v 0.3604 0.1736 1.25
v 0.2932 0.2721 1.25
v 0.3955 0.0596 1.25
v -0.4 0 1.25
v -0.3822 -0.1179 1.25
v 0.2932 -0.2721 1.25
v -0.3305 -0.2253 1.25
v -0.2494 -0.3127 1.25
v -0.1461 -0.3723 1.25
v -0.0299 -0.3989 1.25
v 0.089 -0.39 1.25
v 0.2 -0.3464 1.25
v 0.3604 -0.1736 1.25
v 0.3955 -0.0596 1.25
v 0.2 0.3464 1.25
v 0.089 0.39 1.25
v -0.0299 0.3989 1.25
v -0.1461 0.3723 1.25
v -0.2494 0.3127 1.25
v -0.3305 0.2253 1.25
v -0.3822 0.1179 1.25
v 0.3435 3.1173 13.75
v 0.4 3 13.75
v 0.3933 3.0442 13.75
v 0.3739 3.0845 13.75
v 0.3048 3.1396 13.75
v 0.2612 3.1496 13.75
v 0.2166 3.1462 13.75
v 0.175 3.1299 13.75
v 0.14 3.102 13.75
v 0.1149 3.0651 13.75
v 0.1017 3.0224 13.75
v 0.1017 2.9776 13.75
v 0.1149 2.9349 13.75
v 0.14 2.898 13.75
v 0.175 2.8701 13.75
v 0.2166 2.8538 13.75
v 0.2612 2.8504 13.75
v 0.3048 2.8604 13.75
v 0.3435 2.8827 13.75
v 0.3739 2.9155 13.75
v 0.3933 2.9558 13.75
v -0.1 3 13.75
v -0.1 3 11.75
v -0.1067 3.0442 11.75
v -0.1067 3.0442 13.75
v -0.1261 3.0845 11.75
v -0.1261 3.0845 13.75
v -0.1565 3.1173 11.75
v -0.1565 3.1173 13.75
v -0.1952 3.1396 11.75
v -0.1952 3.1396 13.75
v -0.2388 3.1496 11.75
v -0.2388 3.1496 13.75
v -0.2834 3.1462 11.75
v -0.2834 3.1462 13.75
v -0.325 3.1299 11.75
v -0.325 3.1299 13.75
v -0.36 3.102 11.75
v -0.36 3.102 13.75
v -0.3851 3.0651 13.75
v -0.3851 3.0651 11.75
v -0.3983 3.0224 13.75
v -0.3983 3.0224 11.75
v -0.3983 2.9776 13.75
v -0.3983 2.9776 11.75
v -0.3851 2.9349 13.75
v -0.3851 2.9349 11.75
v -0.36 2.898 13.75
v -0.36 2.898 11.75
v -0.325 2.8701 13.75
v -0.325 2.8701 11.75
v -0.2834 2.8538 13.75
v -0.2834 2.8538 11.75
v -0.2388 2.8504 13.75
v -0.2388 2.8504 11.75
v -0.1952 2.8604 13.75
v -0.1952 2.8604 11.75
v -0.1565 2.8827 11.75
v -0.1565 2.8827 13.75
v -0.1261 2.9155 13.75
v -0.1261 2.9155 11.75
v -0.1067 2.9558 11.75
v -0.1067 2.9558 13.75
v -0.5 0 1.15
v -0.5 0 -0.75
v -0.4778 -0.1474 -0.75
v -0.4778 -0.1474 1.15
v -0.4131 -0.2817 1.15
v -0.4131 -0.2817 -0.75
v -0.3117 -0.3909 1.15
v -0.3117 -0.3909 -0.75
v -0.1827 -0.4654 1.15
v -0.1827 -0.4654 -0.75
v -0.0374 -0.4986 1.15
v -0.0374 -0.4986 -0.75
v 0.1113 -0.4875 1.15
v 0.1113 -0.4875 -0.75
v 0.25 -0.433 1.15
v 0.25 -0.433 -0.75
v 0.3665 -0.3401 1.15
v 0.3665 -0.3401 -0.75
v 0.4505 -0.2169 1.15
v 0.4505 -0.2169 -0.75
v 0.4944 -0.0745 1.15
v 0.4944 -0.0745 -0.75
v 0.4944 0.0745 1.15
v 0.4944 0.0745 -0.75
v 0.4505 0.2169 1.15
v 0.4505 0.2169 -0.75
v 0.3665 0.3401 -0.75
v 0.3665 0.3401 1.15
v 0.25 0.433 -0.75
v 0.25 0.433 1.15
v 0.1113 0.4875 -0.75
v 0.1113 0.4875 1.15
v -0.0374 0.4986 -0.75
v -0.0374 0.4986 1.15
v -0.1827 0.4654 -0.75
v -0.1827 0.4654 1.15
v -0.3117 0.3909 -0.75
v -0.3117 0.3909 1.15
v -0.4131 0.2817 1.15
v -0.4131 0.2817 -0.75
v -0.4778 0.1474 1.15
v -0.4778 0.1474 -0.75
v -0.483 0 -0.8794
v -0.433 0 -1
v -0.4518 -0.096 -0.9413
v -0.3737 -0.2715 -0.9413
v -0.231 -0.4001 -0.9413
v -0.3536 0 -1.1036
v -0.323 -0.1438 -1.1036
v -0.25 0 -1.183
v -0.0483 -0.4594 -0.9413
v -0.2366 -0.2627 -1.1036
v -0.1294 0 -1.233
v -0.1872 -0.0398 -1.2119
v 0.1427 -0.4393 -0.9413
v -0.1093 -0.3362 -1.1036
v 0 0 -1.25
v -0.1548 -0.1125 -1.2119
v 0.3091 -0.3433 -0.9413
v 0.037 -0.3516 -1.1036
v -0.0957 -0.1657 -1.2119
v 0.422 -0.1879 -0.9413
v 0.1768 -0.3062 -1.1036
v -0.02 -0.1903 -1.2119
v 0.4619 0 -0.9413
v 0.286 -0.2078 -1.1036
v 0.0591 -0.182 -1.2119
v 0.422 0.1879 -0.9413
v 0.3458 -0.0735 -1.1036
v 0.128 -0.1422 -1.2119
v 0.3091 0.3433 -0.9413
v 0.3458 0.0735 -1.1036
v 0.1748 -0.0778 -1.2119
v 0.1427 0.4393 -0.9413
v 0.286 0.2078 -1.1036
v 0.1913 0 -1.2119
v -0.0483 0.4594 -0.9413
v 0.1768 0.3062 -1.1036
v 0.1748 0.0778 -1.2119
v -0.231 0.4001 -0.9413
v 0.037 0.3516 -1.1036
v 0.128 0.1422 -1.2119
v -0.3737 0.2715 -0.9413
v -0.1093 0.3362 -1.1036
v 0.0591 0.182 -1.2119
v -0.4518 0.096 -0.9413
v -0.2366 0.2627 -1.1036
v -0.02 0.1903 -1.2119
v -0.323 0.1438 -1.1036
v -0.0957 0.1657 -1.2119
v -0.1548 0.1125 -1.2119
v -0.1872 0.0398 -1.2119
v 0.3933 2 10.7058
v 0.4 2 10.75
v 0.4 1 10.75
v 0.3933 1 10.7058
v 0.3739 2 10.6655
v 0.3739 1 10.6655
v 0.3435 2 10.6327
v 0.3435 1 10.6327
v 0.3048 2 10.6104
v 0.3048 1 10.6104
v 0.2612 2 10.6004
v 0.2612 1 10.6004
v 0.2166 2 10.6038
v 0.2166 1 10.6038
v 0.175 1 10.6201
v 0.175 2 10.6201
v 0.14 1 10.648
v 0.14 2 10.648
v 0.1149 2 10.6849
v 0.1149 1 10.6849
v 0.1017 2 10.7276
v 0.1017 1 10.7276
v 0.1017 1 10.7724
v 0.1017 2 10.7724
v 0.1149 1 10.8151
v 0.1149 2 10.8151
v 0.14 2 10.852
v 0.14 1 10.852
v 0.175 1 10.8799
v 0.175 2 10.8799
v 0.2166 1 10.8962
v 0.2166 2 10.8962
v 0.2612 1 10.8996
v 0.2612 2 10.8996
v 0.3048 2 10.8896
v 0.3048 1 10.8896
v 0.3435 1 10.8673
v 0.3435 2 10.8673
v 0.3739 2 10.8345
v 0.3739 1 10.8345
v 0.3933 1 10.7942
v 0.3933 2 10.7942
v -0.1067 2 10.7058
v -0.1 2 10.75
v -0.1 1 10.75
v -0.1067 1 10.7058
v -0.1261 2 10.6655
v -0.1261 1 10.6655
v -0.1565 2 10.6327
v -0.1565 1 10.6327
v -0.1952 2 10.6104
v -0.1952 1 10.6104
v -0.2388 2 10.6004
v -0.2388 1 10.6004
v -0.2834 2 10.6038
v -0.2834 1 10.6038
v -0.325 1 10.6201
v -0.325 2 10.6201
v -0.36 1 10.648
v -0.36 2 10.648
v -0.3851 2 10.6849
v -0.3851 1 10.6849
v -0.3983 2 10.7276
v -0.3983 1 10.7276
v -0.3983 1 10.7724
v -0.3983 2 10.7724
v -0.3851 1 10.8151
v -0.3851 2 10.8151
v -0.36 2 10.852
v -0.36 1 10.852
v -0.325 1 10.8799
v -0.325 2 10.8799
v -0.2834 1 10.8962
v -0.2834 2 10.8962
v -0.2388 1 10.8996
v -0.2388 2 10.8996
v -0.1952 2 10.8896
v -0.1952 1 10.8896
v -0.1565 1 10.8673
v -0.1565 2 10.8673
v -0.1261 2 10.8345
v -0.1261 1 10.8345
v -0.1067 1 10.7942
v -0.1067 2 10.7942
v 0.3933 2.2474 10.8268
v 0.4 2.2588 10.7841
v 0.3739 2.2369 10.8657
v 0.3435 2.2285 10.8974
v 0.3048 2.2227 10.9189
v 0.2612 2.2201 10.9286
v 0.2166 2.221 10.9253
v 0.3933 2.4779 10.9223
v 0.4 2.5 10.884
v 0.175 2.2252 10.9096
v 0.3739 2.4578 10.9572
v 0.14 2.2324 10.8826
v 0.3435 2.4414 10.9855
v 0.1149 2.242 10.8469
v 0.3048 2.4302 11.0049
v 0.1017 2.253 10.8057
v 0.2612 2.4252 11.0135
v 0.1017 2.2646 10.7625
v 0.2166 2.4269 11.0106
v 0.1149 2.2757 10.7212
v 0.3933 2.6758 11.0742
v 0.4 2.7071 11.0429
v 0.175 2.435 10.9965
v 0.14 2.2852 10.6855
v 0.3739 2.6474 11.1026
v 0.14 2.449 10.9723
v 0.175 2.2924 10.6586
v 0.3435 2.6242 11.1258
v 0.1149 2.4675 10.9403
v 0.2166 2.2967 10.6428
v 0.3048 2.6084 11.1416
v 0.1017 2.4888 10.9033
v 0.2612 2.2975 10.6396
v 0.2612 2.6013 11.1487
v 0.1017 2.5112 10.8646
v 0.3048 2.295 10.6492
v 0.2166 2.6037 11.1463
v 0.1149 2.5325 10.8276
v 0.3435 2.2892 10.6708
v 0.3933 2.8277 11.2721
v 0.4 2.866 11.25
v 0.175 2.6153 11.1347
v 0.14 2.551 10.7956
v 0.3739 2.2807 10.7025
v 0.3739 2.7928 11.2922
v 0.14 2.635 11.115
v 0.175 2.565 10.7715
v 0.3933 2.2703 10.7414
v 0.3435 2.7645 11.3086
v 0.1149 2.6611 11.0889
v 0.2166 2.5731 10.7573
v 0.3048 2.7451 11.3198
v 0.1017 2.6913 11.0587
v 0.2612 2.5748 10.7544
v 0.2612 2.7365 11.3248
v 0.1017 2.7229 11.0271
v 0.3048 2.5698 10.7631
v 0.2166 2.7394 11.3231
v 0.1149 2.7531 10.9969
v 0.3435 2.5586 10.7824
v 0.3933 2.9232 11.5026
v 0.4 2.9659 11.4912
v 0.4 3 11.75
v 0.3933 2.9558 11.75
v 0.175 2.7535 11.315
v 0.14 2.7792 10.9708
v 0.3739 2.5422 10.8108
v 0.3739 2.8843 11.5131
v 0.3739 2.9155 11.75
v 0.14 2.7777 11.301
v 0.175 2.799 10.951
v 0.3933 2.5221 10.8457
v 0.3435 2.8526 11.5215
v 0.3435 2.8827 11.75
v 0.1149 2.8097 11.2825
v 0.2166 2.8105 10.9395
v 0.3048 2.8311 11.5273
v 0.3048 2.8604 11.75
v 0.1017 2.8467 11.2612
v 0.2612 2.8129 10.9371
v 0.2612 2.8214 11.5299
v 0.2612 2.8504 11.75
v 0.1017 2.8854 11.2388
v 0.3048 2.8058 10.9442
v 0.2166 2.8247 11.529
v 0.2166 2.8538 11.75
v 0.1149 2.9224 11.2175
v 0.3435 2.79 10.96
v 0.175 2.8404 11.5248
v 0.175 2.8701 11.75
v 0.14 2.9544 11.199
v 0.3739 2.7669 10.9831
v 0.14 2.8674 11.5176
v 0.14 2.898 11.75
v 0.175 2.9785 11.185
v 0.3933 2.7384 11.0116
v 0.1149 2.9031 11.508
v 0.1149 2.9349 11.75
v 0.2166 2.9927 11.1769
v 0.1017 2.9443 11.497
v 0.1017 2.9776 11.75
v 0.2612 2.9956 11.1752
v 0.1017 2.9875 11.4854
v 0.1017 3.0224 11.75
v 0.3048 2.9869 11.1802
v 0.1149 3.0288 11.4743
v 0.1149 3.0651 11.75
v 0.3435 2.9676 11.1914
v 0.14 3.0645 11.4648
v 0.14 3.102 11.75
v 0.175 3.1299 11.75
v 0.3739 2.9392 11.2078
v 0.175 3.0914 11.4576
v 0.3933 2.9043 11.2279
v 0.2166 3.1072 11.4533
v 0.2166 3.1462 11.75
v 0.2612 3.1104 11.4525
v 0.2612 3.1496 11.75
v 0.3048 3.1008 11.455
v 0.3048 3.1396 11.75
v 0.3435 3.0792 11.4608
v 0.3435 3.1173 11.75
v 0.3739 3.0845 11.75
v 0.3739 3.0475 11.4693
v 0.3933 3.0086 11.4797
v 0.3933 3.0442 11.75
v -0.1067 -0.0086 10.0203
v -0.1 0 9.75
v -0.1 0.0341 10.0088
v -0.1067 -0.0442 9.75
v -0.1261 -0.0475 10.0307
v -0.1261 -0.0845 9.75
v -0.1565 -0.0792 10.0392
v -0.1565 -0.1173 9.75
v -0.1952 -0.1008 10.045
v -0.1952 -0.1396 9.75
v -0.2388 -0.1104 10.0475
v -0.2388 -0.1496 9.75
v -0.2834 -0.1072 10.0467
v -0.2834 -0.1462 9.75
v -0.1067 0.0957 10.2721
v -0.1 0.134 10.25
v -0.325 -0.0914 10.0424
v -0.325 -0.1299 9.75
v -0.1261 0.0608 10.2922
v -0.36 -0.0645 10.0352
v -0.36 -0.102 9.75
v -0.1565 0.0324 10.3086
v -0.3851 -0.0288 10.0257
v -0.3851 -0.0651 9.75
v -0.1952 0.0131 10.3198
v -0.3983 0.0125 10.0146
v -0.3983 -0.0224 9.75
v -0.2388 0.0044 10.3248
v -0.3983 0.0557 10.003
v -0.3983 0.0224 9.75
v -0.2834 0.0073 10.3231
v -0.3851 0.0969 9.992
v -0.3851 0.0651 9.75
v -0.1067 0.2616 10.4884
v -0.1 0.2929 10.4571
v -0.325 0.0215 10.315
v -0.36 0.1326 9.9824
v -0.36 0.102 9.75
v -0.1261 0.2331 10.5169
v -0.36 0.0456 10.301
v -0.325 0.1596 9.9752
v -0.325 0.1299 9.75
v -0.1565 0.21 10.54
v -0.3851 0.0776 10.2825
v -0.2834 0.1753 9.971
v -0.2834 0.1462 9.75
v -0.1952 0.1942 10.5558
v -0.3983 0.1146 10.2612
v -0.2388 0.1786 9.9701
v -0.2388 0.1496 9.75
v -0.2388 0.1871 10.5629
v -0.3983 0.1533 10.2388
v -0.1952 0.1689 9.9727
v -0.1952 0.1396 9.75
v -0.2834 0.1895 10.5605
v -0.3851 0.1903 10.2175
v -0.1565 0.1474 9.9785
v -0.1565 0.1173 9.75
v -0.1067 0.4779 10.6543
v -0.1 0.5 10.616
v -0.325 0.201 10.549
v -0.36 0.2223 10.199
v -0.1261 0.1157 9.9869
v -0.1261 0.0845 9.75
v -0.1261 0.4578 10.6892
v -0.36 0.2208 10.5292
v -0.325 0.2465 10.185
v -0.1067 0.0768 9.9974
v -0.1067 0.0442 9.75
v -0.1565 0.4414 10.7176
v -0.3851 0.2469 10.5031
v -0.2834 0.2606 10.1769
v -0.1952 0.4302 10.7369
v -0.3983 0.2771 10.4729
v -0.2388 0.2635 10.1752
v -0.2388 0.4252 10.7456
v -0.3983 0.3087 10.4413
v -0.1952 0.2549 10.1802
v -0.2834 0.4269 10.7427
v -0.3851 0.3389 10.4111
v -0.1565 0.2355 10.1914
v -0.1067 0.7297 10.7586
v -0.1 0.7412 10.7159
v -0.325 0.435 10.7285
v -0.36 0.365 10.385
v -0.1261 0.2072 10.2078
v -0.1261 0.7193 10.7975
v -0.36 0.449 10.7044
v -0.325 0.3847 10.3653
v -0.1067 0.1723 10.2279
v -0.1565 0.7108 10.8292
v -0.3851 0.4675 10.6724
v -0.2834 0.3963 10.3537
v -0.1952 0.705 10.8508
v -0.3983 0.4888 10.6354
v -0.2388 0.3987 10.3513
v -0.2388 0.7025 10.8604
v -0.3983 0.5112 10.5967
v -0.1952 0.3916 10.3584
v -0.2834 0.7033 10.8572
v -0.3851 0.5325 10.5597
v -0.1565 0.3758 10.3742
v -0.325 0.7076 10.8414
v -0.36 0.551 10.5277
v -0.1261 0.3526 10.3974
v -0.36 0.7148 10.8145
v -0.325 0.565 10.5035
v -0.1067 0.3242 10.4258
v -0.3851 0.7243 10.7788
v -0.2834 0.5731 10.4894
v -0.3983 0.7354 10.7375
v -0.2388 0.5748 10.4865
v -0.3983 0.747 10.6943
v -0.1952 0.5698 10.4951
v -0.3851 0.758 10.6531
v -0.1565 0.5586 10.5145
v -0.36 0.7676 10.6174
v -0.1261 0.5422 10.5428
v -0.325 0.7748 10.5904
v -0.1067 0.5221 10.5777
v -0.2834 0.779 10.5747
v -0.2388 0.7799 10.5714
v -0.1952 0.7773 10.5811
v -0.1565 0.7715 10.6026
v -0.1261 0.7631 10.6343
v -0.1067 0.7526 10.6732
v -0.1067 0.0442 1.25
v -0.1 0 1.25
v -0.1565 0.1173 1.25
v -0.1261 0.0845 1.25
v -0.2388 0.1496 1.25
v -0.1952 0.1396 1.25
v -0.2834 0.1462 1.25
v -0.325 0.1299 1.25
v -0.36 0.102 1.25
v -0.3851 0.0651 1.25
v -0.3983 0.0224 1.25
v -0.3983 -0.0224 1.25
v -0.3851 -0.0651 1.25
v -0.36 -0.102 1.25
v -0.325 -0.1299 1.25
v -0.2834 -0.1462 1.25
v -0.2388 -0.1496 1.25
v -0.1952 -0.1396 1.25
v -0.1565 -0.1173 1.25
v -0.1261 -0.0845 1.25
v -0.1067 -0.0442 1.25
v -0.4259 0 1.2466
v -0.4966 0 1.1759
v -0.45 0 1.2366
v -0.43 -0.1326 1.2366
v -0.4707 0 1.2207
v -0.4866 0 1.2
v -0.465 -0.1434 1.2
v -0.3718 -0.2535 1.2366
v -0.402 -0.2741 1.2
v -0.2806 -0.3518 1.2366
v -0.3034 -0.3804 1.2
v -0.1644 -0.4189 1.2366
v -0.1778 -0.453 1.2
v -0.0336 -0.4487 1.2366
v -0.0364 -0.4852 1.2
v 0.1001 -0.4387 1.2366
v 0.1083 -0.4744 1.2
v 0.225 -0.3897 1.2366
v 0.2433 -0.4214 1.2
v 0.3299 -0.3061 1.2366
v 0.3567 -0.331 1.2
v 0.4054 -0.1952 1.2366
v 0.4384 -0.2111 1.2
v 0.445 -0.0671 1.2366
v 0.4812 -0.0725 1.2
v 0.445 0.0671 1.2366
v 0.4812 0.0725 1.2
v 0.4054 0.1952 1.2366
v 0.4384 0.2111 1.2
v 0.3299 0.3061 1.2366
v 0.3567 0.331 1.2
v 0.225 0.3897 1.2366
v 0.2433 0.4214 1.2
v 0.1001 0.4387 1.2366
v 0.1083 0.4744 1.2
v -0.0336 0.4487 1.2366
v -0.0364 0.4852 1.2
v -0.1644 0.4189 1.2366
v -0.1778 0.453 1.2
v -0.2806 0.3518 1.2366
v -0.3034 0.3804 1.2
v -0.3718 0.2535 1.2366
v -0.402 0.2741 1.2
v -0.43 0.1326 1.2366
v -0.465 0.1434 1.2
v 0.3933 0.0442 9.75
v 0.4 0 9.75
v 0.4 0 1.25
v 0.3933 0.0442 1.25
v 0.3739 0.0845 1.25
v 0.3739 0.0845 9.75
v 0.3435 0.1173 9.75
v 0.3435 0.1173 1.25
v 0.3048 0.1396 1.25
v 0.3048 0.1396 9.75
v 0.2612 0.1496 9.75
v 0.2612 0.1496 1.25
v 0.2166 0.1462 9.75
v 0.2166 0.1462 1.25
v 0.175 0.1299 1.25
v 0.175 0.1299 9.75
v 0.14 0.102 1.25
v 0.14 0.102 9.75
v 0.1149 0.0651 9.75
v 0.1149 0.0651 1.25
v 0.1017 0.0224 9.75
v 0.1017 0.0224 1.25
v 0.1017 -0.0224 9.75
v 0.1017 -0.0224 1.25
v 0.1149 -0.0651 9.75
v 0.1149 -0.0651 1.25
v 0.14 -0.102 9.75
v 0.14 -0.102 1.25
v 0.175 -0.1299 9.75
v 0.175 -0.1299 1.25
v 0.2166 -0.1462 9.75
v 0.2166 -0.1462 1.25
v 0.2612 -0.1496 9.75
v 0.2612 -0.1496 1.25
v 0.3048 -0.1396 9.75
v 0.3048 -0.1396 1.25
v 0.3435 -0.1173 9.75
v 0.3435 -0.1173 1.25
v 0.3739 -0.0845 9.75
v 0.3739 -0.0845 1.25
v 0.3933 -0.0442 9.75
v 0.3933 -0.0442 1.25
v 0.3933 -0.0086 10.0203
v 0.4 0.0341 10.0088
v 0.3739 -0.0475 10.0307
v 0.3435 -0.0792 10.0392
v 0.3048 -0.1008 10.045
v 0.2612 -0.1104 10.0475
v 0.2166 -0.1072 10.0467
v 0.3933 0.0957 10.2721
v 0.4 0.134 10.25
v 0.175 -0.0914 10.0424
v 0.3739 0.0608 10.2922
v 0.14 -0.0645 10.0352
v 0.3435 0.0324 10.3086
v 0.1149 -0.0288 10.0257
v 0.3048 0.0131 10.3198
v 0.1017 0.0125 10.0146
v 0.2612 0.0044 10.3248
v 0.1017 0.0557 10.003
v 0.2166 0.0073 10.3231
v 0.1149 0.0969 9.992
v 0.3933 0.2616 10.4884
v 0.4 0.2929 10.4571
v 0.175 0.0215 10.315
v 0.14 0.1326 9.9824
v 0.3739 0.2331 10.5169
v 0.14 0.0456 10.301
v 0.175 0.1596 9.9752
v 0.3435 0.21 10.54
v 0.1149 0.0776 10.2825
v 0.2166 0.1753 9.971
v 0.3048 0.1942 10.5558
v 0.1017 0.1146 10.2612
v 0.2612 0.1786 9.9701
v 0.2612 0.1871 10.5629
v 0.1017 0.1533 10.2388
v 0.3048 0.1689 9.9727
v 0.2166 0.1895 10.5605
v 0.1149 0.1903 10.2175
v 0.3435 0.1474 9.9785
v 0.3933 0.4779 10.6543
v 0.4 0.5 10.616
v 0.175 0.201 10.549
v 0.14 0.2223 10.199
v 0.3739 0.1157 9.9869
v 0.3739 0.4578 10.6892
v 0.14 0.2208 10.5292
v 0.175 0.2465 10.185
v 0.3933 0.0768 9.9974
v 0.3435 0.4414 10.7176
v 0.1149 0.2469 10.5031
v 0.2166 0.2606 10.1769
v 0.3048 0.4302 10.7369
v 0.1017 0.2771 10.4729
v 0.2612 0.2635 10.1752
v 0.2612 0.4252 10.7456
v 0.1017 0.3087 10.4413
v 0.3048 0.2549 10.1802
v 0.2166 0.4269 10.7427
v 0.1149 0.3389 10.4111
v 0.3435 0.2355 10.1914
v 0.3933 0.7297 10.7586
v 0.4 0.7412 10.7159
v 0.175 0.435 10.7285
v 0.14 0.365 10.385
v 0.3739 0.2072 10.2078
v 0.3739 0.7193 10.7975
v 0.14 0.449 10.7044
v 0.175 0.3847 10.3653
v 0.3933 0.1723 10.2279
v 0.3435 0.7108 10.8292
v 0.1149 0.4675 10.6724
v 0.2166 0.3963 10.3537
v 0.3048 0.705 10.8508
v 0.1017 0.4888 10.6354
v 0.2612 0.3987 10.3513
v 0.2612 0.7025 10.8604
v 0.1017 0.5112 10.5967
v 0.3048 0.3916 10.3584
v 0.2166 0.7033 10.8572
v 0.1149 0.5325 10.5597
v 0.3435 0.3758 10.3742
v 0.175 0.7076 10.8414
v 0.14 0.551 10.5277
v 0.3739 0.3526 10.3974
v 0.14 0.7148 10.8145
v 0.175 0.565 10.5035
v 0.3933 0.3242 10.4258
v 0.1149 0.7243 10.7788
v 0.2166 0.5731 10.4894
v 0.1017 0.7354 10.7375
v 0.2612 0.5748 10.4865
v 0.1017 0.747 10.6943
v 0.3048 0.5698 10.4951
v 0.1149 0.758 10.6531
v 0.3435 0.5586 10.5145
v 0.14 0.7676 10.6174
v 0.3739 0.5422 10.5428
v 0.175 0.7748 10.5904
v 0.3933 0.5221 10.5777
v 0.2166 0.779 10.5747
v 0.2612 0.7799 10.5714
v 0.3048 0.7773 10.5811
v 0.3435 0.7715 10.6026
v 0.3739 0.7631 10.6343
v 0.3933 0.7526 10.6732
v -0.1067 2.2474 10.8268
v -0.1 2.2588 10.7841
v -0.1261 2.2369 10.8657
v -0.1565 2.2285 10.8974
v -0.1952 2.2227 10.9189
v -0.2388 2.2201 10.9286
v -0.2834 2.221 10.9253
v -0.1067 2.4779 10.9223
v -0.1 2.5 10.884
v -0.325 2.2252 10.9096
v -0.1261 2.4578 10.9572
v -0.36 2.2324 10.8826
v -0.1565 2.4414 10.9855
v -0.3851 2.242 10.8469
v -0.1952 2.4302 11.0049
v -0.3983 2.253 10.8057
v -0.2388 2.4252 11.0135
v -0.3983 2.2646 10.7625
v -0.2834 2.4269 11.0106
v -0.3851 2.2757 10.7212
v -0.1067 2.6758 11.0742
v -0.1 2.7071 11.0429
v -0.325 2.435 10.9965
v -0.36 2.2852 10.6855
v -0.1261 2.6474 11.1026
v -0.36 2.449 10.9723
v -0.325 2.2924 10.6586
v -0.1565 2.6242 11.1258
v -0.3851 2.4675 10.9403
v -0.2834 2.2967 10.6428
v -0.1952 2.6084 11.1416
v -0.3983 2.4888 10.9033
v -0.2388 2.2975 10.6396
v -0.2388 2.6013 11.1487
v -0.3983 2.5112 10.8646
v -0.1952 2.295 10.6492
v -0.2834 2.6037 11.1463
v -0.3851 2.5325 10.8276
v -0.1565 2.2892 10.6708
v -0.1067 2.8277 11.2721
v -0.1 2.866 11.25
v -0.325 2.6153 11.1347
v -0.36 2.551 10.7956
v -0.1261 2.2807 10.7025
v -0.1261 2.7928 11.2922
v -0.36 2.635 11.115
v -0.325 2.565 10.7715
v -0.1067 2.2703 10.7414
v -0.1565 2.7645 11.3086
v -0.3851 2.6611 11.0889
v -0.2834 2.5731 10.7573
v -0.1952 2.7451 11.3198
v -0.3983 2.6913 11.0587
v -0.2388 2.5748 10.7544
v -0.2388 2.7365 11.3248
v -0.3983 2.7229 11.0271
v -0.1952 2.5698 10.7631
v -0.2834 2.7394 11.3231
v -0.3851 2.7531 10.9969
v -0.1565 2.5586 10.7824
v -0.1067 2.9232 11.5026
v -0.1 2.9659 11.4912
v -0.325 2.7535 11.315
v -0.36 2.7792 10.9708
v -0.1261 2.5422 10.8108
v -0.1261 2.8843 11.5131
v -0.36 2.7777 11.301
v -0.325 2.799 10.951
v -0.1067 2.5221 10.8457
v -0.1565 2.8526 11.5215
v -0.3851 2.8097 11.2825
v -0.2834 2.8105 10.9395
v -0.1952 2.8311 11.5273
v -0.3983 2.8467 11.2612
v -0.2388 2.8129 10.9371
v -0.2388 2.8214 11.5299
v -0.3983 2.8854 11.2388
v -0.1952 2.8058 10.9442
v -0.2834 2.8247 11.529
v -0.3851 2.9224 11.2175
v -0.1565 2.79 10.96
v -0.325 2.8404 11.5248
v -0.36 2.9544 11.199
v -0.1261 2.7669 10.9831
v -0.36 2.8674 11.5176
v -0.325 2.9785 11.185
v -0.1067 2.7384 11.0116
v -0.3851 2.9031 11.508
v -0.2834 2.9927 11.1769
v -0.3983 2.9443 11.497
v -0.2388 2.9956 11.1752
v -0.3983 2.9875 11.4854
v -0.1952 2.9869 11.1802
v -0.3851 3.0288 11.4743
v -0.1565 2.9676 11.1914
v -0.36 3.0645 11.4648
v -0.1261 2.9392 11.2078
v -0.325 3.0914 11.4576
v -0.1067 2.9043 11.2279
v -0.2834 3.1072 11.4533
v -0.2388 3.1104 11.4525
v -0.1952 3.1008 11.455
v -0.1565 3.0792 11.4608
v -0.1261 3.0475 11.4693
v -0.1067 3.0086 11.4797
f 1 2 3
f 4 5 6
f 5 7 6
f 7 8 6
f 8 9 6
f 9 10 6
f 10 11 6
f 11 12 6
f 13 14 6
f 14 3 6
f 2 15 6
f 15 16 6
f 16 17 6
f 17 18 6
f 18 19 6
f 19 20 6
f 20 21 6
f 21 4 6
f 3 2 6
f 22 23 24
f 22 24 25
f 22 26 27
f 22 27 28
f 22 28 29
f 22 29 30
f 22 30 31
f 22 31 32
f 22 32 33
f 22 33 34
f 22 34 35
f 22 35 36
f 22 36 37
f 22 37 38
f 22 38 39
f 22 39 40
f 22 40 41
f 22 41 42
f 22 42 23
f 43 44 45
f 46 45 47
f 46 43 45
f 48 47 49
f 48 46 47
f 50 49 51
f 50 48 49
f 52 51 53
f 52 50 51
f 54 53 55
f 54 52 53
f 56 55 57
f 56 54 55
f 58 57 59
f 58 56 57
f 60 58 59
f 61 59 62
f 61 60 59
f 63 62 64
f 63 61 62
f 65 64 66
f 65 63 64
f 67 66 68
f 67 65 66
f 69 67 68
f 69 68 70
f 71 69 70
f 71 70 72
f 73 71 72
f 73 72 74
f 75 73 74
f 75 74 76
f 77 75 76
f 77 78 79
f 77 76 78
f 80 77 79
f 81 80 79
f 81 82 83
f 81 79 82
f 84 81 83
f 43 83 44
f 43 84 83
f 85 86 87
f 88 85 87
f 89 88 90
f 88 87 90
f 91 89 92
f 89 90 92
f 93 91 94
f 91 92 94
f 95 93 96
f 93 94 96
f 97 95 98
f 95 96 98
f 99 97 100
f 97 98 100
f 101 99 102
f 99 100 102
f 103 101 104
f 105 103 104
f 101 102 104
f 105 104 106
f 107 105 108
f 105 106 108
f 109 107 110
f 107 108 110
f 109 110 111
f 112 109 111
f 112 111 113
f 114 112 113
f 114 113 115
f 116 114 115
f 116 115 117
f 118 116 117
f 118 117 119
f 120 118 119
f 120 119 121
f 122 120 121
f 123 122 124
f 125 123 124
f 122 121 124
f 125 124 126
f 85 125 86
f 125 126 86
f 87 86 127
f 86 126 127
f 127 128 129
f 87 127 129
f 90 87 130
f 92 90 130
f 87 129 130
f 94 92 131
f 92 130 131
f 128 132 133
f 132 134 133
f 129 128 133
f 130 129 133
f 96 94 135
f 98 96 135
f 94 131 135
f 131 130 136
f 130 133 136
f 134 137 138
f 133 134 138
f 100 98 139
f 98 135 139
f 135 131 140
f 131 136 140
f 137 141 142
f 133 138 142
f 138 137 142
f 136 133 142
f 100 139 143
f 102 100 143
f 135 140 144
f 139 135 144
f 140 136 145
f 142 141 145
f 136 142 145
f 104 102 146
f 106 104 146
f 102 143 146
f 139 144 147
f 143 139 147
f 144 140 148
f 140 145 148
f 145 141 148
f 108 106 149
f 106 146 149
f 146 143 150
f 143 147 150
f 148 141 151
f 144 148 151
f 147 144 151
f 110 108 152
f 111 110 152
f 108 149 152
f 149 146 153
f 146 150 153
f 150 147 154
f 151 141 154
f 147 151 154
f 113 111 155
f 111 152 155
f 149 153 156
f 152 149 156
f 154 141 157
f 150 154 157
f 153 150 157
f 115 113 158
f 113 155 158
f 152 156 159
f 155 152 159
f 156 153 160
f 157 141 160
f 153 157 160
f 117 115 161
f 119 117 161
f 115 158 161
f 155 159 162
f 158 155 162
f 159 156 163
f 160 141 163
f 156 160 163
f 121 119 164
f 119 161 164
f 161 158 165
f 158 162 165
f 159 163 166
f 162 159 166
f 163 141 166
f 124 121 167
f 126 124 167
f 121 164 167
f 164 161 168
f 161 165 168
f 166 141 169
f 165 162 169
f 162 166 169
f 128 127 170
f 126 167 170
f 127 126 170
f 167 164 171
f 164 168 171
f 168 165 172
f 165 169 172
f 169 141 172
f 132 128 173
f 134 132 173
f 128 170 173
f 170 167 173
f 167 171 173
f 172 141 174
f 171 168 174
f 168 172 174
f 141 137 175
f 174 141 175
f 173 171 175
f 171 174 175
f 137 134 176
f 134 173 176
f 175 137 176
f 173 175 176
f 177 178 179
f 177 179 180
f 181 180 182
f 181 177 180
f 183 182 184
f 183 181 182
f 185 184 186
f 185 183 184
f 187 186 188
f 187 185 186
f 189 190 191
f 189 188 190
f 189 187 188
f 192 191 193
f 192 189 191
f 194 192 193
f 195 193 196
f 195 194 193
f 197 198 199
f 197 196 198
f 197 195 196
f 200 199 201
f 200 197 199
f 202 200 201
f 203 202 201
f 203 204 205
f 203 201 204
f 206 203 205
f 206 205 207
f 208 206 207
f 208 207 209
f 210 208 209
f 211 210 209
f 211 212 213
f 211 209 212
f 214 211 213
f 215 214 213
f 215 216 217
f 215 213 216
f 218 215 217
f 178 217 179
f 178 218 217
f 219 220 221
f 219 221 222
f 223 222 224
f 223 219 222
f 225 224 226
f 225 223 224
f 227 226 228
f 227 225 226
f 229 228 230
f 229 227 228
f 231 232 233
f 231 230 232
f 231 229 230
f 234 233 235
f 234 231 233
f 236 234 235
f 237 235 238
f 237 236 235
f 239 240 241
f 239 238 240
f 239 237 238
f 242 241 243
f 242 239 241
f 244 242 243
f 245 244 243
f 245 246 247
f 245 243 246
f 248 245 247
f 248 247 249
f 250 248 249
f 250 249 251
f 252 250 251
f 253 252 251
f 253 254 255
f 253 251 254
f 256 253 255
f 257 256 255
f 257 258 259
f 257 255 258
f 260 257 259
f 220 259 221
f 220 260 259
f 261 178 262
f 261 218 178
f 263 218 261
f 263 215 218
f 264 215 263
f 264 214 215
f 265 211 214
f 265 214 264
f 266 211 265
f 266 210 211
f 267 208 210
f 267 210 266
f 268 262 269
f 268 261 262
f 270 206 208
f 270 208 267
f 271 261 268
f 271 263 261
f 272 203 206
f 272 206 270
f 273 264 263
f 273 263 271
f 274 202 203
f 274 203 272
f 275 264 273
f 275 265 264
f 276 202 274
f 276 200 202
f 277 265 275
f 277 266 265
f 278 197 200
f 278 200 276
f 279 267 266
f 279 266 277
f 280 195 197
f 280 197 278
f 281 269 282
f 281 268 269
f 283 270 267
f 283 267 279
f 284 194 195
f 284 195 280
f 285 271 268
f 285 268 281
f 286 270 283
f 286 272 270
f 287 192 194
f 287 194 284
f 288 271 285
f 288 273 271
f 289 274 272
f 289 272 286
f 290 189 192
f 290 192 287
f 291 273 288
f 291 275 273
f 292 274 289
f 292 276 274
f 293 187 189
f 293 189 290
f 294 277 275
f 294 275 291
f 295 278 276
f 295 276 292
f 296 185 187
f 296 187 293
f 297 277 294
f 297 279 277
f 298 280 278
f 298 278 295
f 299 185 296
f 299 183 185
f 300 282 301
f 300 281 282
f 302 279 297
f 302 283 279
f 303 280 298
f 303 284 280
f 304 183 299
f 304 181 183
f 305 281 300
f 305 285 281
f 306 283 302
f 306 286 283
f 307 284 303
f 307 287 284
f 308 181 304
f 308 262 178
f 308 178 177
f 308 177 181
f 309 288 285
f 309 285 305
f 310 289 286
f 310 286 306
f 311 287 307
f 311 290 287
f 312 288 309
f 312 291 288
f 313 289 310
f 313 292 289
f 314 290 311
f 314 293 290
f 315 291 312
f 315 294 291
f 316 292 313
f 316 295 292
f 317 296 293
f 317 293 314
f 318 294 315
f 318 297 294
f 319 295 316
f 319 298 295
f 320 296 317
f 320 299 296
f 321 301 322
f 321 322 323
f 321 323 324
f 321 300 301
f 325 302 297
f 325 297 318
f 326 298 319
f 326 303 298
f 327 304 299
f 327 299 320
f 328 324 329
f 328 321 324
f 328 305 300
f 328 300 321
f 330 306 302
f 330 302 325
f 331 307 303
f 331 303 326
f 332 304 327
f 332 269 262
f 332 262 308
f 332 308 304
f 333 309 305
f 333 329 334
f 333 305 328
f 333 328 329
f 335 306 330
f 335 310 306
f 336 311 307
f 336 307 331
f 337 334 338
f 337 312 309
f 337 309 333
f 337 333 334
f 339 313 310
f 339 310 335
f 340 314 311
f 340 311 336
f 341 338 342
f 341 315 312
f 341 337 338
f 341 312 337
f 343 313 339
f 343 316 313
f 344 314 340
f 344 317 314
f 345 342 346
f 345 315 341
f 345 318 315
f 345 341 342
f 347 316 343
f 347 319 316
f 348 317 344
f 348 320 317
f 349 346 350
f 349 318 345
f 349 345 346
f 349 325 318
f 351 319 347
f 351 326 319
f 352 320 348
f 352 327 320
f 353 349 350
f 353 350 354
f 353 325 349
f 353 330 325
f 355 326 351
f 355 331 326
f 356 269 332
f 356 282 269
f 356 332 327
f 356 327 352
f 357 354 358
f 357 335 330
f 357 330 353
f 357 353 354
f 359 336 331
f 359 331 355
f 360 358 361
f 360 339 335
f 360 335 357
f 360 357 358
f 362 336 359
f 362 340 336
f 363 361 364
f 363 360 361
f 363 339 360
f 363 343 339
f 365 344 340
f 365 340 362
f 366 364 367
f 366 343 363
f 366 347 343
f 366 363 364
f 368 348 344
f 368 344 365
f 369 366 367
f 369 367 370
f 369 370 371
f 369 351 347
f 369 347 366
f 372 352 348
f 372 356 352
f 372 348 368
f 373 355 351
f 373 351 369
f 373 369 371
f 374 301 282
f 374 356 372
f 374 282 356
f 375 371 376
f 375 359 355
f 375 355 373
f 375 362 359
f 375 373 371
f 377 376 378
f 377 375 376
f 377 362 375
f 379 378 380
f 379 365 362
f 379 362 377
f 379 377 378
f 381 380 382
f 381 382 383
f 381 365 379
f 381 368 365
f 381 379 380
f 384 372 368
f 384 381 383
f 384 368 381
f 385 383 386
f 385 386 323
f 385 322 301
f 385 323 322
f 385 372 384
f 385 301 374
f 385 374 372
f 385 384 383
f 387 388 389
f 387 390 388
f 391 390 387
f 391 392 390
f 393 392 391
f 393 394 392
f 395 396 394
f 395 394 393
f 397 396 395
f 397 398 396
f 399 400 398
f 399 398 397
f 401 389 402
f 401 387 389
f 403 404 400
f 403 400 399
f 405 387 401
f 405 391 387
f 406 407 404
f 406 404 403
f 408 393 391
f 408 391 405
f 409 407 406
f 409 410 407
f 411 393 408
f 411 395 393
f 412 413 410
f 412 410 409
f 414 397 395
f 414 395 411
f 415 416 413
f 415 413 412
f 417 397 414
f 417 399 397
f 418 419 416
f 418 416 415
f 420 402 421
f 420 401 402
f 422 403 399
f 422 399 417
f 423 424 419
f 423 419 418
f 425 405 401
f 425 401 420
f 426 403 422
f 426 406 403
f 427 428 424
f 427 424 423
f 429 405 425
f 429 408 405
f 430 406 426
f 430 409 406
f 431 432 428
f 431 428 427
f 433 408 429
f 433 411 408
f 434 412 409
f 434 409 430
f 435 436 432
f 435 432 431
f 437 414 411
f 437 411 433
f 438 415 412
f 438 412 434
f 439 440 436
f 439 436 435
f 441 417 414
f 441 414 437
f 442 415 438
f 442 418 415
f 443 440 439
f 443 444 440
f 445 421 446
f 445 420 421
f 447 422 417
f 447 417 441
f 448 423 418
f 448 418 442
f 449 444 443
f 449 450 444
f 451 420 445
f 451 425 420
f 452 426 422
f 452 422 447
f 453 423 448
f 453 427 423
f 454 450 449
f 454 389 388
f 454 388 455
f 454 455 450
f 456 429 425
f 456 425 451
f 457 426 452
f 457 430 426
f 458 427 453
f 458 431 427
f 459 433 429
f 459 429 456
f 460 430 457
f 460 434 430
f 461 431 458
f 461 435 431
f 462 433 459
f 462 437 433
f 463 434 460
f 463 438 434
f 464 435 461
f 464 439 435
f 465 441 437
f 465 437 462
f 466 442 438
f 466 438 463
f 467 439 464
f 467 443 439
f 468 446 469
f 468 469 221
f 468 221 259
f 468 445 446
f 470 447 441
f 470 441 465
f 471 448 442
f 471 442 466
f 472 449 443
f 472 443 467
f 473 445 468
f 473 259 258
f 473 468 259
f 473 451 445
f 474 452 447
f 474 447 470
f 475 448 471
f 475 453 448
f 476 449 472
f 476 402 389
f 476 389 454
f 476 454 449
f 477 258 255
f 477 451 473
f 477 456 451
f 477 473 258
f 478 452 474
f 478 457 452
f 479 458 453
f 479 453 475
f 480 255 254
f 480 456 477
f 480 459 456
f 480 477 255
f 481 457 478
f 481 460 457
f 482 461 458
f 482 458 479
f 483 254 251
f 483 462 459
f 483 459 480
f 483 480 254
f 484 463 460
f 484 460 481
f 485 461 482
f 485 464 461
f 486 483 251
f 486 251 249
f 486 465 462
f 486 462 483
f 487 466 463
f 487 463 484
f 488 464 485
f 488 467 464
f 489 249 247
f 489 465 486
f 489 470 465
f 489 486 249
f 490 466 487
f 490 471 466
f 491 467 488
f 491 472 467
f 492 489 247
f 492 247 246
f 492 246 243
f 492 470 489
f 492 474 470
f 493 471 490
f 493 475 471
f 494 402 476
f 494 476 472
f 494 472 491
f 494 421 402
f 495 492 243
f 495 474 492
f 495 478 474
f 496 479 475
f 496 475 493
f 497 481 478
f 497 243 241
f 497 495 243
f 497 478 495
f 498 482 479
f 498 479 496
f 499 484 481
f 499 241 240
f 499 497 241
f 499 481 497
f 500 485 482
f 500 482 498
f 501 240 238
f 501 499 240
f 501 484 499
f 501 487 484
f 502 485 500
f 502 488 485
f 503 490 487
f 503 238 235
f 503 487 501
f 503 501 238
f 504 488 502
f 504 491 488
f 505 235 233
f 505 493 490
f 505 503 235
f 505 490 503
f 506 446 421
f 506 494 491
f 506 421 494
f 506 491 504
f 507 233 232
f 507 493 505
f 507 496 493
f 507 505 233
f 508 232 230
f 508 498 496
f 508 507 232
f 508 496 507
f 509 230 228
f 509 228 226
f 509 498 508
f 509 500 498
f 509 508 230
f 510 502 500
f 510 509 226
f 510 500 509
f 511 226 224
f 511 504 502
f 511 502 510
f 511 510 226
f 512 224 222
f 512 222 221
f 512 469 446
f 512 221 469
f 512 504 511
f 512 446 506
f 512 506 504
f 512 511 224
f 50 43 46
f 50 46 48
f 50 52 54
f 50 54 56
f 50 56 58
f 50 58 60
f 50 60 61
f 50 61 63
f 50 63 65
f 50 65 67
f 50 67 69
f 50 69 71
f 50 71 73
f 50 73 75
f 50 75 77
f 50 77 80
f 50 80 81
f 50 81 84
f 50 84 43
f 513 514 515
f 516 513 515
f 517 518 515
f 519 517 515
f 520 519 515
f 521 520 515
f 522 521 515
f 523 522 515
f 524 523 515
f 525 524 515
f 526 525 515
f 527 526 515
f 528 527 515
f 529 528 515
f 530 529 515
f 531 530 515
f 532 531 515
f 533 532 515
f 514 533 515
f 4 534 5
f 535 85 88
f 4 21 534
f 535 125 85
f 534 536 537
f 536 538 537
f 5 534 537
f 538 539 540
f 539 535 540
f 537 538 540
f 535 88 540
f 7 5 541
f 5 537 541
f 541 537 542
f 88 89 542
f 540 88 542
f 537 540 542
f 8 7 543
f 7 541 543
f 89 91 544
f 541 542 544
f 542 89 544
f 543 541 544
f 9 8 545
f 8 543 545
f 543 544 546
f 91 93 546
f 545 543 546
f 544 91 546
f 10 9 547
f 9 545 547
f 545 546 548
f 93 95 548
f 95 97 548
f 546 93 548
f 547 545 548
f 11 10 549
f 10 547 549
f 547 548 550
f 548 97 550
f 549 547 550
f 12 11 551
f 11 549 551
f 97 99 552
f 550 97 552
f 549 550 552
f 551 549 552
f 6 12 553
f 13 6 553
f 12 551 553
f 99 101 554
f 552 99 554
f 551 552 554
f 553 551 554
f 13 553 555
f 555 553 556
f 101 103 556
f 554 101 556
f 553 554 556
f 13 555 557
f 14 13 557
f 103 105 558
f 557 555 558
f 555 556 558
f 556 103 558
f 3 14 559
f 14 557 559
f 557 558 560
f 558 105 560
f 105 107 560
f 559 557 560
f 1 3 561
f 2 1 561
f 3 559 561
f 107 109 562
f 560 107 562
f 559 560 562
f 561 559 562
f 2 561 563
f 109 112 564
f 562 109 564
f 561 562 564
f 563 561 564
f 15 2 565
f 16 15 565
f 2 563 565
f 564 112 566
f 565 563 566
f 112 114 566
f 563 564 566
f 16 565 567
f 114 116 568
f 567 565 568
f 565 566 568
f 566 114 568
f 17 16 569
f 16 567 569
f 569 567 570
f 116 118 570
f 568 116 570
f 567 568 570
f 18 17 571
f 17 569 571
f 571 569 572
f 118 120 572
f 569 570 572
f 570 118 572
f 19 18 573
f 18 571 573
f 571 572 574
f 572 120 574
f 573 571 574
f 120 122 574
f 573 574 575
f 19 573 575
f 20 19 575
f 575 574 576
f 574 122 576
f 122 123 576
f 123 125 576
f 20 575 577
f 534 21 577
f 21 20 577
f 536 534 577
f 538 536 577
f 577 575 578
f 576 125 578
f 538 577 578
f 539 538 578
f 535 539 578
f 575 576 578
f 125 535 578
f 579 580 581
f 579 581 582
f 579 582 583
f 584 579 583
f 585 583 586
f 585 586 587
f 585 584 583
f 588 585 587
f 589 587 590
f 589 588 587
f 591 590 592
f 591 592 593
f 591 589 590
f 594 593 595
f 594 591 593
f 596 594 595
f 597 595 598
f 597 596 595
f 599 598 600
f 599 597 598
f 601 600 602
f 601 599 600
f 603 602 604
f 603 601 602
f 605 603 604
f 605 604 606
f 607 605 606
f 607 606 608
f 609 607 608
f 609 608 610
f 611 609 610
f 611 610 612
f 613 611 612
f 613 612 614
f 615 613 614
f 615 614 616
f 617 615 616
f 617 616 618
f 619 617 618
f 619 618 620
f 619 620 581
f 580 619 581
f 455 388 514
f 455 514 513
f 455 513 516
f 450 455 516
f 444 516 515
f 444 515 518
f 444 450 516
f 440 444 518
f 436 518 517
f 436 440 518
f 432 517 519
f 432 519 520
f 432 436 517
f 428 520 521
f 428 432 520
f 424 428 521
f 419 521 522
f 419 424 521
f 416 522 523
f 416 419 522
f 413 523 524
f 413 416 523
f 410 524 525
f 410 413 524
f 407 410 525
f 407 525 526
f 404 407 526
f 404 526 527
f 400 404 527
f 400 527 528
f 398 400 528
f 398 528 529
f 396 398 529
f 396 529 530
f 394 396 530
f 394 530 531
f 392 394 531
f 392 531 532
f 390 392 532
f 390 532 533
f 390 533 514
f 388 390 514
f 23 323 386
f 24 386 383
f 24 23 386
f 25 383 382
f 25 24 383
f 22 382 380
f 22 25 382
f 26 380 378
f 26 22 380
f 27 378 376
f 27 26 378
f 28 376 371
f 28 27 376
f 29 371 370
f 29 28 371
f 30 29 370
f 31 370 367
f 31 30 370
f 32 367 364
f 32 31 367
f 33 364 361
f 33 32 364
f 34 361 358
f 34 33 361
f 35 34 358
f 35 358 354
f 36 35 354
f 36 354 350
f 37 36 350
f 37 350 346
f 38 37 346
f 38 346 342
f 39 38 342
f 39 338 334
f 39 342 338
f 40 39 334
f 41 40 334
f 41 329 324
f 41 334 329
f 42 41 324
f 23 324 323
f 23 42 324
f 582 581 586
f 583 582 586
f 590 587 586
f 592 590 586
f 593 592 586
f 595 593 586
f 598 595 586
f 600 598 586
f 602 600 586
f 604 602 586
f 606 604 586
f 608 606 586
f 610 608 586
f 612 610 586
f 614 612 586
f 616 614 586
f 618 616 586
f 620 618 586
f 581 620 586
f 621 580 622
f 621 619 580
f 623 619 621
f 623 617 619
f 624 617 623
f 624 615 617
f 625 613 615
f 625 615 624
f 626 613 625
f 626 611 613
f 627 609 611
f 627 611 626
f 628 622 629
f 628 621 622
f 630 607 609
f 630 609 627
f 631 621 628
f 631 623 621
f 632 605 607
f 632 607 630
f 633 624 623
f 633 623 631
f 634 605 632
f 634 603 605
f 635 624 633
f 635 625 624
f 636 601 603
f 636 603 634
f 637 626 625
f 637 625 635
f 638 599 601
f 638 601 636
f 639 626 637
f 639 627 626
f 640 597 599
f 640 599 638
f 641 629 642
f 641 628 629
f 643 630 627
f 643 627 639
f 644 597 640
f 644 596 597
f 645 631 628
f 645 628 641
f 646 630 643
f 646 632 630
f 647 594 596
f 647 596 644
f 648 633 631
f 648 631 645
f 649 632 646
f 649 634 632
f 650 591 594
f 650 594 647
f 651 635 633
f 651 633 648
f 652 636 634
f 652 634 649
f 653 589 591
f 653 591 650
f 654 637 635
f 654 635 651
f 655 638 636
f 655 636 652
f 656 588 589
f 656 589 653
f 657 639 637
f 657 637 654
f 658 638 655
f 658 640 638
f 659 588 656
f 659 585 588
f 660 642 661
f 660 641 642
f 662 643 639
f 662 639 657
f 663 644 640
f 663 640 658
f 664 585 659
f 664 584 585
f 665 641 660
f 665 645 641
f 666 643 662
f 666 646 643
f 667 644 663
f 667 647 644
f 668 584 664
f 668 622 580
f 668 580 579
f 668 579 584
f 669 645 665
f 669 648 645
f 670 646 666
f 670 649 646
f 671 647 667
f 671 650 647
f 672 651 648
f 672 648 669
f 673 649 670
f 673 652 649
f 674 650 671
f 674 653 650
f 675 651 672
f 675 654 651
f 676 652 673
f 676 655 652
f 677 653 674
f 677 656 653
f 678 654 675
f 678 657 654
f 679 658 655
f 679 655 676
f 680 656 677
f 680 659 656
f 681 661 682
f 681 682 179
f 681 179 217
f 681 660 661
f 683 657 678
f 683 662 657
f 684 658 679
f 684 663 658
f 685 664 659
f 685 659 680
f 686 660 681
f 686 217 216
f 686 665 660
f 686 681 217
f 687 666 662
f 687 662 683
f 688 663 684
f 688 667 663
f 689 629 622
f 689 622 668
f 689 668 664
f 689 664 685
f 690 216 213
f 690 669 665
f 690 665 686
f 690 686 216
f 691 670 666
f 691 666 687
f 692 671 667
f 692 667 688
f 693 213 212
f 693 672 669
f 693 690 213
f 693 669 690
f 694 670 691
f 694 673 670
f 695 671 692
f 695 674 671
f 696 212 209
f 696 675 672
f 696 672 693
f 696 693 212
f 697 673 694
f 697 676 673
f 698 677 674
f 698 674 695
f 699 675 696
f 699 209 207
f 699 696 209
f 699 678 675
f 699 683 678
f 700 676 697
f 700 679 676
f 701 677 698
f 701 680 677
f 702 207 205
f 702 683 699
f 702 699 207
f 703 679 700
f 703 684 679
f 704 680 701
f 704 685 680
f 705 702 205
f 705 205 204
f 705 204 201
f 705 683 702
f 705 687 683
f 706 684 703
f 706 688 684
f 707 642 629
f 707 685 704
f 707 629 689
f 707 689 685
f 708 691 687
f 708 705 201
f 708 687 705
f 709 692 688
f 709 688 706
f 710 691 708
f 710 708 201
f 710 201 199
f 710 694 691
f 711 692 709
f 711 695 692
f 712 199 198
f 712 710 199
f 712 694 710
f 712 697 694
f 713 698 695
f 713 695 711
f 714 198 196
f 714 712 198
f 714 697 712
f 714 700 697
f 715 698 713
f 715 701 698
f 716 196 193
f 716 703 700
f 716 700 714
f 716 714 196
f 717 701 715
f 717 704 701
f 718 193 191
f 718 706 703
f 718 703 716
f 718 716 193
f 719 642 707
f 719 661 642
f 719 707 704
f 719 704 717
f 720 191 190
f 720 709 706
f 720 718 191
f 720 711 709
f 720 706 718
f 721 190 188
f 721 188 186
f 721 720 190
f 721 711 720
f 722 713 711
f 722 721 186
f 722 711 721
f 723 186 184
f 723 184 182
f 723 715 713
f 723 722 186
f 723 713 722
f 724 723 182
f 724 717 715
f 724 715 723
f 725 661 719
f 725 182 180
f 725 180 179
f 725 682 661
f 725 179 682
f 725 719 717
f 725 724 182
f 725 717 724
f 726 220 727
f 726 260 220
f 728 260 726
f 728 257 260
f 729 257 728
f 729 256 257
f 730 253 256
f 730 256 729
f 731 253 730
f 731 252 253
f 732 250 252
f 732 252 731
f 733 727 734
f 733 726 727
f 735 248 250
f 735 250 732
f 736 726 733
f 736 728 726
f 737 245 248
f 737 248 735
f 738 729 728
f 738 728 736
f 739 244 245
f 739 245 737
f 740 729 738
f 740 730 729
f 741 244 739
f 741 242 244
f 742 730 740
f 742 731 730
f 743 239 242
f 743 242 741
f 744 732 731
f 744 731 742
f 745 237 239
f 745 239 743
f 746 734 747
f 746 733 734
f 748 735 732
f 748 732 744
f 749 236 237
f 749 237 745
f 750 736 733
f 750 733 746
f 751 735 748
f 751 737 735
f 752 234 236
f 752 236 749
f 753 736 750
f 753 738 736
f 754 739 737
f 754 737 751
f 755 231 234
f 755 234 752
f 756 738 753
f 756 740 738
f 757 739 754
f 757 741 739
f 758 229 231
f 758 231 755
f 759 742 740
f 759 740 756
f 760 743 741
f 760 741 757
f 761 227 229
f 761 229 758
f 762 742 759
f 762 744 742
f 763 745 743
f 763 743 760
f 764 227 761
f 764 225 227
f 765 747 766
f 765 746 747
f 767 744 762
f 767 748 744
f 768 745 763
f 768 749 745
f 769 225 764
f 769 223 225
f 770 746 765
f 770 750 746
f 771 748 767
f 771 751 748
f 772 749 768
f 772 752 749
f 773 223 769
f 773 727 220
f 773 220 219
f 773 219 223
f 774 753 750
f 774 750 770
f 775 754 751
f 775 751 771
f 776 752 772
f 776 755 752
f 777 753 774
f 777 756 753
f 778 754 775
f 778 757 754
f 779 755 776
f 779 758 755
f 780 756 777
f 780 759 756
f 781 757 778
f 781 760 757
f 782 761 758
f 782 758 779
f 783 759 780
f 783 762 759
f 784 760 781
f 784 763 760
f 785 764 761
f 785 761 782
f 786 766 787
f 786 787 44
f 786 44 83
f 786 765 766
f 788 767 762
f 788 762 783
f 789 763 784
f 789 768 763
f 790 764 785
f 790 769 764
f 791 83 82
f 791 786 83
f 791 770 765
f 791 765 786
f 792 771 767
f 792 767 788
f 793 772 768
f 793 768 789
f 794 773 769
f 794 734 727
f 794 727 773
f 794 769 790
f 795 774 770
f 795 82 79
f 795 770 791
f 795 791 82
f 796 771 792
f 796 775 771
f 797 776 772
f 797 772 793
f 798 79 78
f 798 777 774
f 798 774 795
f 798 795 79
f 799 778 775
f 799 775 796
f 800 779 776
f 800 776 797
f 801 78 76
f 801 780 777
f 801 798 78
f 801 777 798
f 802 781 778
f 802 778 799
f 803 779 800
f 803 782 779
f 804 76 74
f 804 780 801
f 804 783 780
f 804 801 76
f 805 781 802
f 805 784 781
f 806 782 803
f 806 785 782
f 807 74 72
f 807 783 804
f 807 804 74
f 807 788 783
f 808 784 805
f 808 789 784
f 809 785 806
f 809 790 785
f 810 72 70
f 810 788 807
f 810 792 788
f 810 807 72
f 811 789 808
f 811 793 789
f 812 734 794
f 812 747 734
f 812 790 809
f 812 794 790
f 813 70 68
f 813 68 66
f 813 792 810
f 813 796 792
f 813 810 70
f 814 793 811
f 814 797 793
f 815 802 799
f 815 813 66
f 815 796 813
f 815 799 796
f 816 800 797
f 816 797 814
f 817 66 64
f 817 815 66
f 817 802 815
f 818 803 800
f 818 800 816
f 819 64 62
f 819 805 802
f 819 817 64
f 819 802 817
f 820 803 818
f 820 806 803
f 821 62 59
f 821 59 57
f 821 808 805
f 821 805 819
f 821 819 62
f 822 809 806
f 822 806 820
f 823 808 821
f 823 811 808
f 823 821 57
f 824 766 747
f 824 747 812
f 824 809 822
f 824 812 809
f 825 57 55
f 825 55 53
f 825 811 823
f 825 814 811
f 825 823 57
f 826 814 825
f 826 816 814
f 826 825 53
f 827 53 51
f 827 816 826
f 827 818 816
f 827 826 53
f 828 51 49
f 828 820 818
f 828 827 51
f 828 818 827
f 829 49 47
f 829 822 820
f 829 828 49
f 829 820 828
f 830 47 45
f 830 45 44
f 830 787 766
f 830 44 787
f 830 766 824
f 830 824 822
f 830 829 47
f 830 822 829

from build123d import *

# Parameters (mm, degrees)
FILLET2_R = 0.1
SKETCH3_R = 0.15


with BuildPart() as part:
    # Sketch2 → Revolve1 (revolve)
    with BuildSketch(Plane(origin=(0, 0, 0), x_dir=(1, 0, 0), z_dir=(0, 1, 0))):
        with BuildLine():
            Line((0, 1.25), (0, -1.25))
            Line((0, -1.25), (-0.5, -1.25))
            Line((-0.5, -1.25), (-0.5, 0.75))
            ThreePointArc((-0.5, 0.75), (-0.353553391, 1.103553391), (0, 1.25))
        make_face()
    revolve(axis=Axis((0, 0, -1.25), (0, 0, 1)))

    # Fillet2
    fillet2_edges = [part.edges().sort_by_distance(p)[0] for p in [
        (0.5, 0, 1.25),
    ]]
    fillet(fillet2_edges, radius=FILLET2_R)


with BuildPart() as body_2:
    # Sweep1: sweep along a path in Sketch4
    with BuildLine(Plane(origin=(0, 0, 0), x_dir=(0, 0, -1), z_dir=(1, 0, 0))) as sweep1_path:
        Line((-1.25, 0), (-9.75, 0))
        ThreePointArc((-9.75, 0), (-10.457106781, 0.292893219), (-10.75, 1))
        Line((-10.75, 1), (-10.75, 2))
        ThreePointArc((-10.75, 2), (-11.042893219, 2.707106781), (-11.75, 3))
        Line((-11.75, 3), (-13.75, 3))
    # Sketch3 → Sweep1 (sweep)
    with BuildSketch(Plane.XY.offset(1.25)):
        with Locations((-0.25, 0)):
            Circle(SKETCH3_R)
        with Locations((0.25, 0)):
            Circle(SKETCH3_R)
    sweep(path=sweep1_path.line)


solid = Compound([part.part, body_2.part])
